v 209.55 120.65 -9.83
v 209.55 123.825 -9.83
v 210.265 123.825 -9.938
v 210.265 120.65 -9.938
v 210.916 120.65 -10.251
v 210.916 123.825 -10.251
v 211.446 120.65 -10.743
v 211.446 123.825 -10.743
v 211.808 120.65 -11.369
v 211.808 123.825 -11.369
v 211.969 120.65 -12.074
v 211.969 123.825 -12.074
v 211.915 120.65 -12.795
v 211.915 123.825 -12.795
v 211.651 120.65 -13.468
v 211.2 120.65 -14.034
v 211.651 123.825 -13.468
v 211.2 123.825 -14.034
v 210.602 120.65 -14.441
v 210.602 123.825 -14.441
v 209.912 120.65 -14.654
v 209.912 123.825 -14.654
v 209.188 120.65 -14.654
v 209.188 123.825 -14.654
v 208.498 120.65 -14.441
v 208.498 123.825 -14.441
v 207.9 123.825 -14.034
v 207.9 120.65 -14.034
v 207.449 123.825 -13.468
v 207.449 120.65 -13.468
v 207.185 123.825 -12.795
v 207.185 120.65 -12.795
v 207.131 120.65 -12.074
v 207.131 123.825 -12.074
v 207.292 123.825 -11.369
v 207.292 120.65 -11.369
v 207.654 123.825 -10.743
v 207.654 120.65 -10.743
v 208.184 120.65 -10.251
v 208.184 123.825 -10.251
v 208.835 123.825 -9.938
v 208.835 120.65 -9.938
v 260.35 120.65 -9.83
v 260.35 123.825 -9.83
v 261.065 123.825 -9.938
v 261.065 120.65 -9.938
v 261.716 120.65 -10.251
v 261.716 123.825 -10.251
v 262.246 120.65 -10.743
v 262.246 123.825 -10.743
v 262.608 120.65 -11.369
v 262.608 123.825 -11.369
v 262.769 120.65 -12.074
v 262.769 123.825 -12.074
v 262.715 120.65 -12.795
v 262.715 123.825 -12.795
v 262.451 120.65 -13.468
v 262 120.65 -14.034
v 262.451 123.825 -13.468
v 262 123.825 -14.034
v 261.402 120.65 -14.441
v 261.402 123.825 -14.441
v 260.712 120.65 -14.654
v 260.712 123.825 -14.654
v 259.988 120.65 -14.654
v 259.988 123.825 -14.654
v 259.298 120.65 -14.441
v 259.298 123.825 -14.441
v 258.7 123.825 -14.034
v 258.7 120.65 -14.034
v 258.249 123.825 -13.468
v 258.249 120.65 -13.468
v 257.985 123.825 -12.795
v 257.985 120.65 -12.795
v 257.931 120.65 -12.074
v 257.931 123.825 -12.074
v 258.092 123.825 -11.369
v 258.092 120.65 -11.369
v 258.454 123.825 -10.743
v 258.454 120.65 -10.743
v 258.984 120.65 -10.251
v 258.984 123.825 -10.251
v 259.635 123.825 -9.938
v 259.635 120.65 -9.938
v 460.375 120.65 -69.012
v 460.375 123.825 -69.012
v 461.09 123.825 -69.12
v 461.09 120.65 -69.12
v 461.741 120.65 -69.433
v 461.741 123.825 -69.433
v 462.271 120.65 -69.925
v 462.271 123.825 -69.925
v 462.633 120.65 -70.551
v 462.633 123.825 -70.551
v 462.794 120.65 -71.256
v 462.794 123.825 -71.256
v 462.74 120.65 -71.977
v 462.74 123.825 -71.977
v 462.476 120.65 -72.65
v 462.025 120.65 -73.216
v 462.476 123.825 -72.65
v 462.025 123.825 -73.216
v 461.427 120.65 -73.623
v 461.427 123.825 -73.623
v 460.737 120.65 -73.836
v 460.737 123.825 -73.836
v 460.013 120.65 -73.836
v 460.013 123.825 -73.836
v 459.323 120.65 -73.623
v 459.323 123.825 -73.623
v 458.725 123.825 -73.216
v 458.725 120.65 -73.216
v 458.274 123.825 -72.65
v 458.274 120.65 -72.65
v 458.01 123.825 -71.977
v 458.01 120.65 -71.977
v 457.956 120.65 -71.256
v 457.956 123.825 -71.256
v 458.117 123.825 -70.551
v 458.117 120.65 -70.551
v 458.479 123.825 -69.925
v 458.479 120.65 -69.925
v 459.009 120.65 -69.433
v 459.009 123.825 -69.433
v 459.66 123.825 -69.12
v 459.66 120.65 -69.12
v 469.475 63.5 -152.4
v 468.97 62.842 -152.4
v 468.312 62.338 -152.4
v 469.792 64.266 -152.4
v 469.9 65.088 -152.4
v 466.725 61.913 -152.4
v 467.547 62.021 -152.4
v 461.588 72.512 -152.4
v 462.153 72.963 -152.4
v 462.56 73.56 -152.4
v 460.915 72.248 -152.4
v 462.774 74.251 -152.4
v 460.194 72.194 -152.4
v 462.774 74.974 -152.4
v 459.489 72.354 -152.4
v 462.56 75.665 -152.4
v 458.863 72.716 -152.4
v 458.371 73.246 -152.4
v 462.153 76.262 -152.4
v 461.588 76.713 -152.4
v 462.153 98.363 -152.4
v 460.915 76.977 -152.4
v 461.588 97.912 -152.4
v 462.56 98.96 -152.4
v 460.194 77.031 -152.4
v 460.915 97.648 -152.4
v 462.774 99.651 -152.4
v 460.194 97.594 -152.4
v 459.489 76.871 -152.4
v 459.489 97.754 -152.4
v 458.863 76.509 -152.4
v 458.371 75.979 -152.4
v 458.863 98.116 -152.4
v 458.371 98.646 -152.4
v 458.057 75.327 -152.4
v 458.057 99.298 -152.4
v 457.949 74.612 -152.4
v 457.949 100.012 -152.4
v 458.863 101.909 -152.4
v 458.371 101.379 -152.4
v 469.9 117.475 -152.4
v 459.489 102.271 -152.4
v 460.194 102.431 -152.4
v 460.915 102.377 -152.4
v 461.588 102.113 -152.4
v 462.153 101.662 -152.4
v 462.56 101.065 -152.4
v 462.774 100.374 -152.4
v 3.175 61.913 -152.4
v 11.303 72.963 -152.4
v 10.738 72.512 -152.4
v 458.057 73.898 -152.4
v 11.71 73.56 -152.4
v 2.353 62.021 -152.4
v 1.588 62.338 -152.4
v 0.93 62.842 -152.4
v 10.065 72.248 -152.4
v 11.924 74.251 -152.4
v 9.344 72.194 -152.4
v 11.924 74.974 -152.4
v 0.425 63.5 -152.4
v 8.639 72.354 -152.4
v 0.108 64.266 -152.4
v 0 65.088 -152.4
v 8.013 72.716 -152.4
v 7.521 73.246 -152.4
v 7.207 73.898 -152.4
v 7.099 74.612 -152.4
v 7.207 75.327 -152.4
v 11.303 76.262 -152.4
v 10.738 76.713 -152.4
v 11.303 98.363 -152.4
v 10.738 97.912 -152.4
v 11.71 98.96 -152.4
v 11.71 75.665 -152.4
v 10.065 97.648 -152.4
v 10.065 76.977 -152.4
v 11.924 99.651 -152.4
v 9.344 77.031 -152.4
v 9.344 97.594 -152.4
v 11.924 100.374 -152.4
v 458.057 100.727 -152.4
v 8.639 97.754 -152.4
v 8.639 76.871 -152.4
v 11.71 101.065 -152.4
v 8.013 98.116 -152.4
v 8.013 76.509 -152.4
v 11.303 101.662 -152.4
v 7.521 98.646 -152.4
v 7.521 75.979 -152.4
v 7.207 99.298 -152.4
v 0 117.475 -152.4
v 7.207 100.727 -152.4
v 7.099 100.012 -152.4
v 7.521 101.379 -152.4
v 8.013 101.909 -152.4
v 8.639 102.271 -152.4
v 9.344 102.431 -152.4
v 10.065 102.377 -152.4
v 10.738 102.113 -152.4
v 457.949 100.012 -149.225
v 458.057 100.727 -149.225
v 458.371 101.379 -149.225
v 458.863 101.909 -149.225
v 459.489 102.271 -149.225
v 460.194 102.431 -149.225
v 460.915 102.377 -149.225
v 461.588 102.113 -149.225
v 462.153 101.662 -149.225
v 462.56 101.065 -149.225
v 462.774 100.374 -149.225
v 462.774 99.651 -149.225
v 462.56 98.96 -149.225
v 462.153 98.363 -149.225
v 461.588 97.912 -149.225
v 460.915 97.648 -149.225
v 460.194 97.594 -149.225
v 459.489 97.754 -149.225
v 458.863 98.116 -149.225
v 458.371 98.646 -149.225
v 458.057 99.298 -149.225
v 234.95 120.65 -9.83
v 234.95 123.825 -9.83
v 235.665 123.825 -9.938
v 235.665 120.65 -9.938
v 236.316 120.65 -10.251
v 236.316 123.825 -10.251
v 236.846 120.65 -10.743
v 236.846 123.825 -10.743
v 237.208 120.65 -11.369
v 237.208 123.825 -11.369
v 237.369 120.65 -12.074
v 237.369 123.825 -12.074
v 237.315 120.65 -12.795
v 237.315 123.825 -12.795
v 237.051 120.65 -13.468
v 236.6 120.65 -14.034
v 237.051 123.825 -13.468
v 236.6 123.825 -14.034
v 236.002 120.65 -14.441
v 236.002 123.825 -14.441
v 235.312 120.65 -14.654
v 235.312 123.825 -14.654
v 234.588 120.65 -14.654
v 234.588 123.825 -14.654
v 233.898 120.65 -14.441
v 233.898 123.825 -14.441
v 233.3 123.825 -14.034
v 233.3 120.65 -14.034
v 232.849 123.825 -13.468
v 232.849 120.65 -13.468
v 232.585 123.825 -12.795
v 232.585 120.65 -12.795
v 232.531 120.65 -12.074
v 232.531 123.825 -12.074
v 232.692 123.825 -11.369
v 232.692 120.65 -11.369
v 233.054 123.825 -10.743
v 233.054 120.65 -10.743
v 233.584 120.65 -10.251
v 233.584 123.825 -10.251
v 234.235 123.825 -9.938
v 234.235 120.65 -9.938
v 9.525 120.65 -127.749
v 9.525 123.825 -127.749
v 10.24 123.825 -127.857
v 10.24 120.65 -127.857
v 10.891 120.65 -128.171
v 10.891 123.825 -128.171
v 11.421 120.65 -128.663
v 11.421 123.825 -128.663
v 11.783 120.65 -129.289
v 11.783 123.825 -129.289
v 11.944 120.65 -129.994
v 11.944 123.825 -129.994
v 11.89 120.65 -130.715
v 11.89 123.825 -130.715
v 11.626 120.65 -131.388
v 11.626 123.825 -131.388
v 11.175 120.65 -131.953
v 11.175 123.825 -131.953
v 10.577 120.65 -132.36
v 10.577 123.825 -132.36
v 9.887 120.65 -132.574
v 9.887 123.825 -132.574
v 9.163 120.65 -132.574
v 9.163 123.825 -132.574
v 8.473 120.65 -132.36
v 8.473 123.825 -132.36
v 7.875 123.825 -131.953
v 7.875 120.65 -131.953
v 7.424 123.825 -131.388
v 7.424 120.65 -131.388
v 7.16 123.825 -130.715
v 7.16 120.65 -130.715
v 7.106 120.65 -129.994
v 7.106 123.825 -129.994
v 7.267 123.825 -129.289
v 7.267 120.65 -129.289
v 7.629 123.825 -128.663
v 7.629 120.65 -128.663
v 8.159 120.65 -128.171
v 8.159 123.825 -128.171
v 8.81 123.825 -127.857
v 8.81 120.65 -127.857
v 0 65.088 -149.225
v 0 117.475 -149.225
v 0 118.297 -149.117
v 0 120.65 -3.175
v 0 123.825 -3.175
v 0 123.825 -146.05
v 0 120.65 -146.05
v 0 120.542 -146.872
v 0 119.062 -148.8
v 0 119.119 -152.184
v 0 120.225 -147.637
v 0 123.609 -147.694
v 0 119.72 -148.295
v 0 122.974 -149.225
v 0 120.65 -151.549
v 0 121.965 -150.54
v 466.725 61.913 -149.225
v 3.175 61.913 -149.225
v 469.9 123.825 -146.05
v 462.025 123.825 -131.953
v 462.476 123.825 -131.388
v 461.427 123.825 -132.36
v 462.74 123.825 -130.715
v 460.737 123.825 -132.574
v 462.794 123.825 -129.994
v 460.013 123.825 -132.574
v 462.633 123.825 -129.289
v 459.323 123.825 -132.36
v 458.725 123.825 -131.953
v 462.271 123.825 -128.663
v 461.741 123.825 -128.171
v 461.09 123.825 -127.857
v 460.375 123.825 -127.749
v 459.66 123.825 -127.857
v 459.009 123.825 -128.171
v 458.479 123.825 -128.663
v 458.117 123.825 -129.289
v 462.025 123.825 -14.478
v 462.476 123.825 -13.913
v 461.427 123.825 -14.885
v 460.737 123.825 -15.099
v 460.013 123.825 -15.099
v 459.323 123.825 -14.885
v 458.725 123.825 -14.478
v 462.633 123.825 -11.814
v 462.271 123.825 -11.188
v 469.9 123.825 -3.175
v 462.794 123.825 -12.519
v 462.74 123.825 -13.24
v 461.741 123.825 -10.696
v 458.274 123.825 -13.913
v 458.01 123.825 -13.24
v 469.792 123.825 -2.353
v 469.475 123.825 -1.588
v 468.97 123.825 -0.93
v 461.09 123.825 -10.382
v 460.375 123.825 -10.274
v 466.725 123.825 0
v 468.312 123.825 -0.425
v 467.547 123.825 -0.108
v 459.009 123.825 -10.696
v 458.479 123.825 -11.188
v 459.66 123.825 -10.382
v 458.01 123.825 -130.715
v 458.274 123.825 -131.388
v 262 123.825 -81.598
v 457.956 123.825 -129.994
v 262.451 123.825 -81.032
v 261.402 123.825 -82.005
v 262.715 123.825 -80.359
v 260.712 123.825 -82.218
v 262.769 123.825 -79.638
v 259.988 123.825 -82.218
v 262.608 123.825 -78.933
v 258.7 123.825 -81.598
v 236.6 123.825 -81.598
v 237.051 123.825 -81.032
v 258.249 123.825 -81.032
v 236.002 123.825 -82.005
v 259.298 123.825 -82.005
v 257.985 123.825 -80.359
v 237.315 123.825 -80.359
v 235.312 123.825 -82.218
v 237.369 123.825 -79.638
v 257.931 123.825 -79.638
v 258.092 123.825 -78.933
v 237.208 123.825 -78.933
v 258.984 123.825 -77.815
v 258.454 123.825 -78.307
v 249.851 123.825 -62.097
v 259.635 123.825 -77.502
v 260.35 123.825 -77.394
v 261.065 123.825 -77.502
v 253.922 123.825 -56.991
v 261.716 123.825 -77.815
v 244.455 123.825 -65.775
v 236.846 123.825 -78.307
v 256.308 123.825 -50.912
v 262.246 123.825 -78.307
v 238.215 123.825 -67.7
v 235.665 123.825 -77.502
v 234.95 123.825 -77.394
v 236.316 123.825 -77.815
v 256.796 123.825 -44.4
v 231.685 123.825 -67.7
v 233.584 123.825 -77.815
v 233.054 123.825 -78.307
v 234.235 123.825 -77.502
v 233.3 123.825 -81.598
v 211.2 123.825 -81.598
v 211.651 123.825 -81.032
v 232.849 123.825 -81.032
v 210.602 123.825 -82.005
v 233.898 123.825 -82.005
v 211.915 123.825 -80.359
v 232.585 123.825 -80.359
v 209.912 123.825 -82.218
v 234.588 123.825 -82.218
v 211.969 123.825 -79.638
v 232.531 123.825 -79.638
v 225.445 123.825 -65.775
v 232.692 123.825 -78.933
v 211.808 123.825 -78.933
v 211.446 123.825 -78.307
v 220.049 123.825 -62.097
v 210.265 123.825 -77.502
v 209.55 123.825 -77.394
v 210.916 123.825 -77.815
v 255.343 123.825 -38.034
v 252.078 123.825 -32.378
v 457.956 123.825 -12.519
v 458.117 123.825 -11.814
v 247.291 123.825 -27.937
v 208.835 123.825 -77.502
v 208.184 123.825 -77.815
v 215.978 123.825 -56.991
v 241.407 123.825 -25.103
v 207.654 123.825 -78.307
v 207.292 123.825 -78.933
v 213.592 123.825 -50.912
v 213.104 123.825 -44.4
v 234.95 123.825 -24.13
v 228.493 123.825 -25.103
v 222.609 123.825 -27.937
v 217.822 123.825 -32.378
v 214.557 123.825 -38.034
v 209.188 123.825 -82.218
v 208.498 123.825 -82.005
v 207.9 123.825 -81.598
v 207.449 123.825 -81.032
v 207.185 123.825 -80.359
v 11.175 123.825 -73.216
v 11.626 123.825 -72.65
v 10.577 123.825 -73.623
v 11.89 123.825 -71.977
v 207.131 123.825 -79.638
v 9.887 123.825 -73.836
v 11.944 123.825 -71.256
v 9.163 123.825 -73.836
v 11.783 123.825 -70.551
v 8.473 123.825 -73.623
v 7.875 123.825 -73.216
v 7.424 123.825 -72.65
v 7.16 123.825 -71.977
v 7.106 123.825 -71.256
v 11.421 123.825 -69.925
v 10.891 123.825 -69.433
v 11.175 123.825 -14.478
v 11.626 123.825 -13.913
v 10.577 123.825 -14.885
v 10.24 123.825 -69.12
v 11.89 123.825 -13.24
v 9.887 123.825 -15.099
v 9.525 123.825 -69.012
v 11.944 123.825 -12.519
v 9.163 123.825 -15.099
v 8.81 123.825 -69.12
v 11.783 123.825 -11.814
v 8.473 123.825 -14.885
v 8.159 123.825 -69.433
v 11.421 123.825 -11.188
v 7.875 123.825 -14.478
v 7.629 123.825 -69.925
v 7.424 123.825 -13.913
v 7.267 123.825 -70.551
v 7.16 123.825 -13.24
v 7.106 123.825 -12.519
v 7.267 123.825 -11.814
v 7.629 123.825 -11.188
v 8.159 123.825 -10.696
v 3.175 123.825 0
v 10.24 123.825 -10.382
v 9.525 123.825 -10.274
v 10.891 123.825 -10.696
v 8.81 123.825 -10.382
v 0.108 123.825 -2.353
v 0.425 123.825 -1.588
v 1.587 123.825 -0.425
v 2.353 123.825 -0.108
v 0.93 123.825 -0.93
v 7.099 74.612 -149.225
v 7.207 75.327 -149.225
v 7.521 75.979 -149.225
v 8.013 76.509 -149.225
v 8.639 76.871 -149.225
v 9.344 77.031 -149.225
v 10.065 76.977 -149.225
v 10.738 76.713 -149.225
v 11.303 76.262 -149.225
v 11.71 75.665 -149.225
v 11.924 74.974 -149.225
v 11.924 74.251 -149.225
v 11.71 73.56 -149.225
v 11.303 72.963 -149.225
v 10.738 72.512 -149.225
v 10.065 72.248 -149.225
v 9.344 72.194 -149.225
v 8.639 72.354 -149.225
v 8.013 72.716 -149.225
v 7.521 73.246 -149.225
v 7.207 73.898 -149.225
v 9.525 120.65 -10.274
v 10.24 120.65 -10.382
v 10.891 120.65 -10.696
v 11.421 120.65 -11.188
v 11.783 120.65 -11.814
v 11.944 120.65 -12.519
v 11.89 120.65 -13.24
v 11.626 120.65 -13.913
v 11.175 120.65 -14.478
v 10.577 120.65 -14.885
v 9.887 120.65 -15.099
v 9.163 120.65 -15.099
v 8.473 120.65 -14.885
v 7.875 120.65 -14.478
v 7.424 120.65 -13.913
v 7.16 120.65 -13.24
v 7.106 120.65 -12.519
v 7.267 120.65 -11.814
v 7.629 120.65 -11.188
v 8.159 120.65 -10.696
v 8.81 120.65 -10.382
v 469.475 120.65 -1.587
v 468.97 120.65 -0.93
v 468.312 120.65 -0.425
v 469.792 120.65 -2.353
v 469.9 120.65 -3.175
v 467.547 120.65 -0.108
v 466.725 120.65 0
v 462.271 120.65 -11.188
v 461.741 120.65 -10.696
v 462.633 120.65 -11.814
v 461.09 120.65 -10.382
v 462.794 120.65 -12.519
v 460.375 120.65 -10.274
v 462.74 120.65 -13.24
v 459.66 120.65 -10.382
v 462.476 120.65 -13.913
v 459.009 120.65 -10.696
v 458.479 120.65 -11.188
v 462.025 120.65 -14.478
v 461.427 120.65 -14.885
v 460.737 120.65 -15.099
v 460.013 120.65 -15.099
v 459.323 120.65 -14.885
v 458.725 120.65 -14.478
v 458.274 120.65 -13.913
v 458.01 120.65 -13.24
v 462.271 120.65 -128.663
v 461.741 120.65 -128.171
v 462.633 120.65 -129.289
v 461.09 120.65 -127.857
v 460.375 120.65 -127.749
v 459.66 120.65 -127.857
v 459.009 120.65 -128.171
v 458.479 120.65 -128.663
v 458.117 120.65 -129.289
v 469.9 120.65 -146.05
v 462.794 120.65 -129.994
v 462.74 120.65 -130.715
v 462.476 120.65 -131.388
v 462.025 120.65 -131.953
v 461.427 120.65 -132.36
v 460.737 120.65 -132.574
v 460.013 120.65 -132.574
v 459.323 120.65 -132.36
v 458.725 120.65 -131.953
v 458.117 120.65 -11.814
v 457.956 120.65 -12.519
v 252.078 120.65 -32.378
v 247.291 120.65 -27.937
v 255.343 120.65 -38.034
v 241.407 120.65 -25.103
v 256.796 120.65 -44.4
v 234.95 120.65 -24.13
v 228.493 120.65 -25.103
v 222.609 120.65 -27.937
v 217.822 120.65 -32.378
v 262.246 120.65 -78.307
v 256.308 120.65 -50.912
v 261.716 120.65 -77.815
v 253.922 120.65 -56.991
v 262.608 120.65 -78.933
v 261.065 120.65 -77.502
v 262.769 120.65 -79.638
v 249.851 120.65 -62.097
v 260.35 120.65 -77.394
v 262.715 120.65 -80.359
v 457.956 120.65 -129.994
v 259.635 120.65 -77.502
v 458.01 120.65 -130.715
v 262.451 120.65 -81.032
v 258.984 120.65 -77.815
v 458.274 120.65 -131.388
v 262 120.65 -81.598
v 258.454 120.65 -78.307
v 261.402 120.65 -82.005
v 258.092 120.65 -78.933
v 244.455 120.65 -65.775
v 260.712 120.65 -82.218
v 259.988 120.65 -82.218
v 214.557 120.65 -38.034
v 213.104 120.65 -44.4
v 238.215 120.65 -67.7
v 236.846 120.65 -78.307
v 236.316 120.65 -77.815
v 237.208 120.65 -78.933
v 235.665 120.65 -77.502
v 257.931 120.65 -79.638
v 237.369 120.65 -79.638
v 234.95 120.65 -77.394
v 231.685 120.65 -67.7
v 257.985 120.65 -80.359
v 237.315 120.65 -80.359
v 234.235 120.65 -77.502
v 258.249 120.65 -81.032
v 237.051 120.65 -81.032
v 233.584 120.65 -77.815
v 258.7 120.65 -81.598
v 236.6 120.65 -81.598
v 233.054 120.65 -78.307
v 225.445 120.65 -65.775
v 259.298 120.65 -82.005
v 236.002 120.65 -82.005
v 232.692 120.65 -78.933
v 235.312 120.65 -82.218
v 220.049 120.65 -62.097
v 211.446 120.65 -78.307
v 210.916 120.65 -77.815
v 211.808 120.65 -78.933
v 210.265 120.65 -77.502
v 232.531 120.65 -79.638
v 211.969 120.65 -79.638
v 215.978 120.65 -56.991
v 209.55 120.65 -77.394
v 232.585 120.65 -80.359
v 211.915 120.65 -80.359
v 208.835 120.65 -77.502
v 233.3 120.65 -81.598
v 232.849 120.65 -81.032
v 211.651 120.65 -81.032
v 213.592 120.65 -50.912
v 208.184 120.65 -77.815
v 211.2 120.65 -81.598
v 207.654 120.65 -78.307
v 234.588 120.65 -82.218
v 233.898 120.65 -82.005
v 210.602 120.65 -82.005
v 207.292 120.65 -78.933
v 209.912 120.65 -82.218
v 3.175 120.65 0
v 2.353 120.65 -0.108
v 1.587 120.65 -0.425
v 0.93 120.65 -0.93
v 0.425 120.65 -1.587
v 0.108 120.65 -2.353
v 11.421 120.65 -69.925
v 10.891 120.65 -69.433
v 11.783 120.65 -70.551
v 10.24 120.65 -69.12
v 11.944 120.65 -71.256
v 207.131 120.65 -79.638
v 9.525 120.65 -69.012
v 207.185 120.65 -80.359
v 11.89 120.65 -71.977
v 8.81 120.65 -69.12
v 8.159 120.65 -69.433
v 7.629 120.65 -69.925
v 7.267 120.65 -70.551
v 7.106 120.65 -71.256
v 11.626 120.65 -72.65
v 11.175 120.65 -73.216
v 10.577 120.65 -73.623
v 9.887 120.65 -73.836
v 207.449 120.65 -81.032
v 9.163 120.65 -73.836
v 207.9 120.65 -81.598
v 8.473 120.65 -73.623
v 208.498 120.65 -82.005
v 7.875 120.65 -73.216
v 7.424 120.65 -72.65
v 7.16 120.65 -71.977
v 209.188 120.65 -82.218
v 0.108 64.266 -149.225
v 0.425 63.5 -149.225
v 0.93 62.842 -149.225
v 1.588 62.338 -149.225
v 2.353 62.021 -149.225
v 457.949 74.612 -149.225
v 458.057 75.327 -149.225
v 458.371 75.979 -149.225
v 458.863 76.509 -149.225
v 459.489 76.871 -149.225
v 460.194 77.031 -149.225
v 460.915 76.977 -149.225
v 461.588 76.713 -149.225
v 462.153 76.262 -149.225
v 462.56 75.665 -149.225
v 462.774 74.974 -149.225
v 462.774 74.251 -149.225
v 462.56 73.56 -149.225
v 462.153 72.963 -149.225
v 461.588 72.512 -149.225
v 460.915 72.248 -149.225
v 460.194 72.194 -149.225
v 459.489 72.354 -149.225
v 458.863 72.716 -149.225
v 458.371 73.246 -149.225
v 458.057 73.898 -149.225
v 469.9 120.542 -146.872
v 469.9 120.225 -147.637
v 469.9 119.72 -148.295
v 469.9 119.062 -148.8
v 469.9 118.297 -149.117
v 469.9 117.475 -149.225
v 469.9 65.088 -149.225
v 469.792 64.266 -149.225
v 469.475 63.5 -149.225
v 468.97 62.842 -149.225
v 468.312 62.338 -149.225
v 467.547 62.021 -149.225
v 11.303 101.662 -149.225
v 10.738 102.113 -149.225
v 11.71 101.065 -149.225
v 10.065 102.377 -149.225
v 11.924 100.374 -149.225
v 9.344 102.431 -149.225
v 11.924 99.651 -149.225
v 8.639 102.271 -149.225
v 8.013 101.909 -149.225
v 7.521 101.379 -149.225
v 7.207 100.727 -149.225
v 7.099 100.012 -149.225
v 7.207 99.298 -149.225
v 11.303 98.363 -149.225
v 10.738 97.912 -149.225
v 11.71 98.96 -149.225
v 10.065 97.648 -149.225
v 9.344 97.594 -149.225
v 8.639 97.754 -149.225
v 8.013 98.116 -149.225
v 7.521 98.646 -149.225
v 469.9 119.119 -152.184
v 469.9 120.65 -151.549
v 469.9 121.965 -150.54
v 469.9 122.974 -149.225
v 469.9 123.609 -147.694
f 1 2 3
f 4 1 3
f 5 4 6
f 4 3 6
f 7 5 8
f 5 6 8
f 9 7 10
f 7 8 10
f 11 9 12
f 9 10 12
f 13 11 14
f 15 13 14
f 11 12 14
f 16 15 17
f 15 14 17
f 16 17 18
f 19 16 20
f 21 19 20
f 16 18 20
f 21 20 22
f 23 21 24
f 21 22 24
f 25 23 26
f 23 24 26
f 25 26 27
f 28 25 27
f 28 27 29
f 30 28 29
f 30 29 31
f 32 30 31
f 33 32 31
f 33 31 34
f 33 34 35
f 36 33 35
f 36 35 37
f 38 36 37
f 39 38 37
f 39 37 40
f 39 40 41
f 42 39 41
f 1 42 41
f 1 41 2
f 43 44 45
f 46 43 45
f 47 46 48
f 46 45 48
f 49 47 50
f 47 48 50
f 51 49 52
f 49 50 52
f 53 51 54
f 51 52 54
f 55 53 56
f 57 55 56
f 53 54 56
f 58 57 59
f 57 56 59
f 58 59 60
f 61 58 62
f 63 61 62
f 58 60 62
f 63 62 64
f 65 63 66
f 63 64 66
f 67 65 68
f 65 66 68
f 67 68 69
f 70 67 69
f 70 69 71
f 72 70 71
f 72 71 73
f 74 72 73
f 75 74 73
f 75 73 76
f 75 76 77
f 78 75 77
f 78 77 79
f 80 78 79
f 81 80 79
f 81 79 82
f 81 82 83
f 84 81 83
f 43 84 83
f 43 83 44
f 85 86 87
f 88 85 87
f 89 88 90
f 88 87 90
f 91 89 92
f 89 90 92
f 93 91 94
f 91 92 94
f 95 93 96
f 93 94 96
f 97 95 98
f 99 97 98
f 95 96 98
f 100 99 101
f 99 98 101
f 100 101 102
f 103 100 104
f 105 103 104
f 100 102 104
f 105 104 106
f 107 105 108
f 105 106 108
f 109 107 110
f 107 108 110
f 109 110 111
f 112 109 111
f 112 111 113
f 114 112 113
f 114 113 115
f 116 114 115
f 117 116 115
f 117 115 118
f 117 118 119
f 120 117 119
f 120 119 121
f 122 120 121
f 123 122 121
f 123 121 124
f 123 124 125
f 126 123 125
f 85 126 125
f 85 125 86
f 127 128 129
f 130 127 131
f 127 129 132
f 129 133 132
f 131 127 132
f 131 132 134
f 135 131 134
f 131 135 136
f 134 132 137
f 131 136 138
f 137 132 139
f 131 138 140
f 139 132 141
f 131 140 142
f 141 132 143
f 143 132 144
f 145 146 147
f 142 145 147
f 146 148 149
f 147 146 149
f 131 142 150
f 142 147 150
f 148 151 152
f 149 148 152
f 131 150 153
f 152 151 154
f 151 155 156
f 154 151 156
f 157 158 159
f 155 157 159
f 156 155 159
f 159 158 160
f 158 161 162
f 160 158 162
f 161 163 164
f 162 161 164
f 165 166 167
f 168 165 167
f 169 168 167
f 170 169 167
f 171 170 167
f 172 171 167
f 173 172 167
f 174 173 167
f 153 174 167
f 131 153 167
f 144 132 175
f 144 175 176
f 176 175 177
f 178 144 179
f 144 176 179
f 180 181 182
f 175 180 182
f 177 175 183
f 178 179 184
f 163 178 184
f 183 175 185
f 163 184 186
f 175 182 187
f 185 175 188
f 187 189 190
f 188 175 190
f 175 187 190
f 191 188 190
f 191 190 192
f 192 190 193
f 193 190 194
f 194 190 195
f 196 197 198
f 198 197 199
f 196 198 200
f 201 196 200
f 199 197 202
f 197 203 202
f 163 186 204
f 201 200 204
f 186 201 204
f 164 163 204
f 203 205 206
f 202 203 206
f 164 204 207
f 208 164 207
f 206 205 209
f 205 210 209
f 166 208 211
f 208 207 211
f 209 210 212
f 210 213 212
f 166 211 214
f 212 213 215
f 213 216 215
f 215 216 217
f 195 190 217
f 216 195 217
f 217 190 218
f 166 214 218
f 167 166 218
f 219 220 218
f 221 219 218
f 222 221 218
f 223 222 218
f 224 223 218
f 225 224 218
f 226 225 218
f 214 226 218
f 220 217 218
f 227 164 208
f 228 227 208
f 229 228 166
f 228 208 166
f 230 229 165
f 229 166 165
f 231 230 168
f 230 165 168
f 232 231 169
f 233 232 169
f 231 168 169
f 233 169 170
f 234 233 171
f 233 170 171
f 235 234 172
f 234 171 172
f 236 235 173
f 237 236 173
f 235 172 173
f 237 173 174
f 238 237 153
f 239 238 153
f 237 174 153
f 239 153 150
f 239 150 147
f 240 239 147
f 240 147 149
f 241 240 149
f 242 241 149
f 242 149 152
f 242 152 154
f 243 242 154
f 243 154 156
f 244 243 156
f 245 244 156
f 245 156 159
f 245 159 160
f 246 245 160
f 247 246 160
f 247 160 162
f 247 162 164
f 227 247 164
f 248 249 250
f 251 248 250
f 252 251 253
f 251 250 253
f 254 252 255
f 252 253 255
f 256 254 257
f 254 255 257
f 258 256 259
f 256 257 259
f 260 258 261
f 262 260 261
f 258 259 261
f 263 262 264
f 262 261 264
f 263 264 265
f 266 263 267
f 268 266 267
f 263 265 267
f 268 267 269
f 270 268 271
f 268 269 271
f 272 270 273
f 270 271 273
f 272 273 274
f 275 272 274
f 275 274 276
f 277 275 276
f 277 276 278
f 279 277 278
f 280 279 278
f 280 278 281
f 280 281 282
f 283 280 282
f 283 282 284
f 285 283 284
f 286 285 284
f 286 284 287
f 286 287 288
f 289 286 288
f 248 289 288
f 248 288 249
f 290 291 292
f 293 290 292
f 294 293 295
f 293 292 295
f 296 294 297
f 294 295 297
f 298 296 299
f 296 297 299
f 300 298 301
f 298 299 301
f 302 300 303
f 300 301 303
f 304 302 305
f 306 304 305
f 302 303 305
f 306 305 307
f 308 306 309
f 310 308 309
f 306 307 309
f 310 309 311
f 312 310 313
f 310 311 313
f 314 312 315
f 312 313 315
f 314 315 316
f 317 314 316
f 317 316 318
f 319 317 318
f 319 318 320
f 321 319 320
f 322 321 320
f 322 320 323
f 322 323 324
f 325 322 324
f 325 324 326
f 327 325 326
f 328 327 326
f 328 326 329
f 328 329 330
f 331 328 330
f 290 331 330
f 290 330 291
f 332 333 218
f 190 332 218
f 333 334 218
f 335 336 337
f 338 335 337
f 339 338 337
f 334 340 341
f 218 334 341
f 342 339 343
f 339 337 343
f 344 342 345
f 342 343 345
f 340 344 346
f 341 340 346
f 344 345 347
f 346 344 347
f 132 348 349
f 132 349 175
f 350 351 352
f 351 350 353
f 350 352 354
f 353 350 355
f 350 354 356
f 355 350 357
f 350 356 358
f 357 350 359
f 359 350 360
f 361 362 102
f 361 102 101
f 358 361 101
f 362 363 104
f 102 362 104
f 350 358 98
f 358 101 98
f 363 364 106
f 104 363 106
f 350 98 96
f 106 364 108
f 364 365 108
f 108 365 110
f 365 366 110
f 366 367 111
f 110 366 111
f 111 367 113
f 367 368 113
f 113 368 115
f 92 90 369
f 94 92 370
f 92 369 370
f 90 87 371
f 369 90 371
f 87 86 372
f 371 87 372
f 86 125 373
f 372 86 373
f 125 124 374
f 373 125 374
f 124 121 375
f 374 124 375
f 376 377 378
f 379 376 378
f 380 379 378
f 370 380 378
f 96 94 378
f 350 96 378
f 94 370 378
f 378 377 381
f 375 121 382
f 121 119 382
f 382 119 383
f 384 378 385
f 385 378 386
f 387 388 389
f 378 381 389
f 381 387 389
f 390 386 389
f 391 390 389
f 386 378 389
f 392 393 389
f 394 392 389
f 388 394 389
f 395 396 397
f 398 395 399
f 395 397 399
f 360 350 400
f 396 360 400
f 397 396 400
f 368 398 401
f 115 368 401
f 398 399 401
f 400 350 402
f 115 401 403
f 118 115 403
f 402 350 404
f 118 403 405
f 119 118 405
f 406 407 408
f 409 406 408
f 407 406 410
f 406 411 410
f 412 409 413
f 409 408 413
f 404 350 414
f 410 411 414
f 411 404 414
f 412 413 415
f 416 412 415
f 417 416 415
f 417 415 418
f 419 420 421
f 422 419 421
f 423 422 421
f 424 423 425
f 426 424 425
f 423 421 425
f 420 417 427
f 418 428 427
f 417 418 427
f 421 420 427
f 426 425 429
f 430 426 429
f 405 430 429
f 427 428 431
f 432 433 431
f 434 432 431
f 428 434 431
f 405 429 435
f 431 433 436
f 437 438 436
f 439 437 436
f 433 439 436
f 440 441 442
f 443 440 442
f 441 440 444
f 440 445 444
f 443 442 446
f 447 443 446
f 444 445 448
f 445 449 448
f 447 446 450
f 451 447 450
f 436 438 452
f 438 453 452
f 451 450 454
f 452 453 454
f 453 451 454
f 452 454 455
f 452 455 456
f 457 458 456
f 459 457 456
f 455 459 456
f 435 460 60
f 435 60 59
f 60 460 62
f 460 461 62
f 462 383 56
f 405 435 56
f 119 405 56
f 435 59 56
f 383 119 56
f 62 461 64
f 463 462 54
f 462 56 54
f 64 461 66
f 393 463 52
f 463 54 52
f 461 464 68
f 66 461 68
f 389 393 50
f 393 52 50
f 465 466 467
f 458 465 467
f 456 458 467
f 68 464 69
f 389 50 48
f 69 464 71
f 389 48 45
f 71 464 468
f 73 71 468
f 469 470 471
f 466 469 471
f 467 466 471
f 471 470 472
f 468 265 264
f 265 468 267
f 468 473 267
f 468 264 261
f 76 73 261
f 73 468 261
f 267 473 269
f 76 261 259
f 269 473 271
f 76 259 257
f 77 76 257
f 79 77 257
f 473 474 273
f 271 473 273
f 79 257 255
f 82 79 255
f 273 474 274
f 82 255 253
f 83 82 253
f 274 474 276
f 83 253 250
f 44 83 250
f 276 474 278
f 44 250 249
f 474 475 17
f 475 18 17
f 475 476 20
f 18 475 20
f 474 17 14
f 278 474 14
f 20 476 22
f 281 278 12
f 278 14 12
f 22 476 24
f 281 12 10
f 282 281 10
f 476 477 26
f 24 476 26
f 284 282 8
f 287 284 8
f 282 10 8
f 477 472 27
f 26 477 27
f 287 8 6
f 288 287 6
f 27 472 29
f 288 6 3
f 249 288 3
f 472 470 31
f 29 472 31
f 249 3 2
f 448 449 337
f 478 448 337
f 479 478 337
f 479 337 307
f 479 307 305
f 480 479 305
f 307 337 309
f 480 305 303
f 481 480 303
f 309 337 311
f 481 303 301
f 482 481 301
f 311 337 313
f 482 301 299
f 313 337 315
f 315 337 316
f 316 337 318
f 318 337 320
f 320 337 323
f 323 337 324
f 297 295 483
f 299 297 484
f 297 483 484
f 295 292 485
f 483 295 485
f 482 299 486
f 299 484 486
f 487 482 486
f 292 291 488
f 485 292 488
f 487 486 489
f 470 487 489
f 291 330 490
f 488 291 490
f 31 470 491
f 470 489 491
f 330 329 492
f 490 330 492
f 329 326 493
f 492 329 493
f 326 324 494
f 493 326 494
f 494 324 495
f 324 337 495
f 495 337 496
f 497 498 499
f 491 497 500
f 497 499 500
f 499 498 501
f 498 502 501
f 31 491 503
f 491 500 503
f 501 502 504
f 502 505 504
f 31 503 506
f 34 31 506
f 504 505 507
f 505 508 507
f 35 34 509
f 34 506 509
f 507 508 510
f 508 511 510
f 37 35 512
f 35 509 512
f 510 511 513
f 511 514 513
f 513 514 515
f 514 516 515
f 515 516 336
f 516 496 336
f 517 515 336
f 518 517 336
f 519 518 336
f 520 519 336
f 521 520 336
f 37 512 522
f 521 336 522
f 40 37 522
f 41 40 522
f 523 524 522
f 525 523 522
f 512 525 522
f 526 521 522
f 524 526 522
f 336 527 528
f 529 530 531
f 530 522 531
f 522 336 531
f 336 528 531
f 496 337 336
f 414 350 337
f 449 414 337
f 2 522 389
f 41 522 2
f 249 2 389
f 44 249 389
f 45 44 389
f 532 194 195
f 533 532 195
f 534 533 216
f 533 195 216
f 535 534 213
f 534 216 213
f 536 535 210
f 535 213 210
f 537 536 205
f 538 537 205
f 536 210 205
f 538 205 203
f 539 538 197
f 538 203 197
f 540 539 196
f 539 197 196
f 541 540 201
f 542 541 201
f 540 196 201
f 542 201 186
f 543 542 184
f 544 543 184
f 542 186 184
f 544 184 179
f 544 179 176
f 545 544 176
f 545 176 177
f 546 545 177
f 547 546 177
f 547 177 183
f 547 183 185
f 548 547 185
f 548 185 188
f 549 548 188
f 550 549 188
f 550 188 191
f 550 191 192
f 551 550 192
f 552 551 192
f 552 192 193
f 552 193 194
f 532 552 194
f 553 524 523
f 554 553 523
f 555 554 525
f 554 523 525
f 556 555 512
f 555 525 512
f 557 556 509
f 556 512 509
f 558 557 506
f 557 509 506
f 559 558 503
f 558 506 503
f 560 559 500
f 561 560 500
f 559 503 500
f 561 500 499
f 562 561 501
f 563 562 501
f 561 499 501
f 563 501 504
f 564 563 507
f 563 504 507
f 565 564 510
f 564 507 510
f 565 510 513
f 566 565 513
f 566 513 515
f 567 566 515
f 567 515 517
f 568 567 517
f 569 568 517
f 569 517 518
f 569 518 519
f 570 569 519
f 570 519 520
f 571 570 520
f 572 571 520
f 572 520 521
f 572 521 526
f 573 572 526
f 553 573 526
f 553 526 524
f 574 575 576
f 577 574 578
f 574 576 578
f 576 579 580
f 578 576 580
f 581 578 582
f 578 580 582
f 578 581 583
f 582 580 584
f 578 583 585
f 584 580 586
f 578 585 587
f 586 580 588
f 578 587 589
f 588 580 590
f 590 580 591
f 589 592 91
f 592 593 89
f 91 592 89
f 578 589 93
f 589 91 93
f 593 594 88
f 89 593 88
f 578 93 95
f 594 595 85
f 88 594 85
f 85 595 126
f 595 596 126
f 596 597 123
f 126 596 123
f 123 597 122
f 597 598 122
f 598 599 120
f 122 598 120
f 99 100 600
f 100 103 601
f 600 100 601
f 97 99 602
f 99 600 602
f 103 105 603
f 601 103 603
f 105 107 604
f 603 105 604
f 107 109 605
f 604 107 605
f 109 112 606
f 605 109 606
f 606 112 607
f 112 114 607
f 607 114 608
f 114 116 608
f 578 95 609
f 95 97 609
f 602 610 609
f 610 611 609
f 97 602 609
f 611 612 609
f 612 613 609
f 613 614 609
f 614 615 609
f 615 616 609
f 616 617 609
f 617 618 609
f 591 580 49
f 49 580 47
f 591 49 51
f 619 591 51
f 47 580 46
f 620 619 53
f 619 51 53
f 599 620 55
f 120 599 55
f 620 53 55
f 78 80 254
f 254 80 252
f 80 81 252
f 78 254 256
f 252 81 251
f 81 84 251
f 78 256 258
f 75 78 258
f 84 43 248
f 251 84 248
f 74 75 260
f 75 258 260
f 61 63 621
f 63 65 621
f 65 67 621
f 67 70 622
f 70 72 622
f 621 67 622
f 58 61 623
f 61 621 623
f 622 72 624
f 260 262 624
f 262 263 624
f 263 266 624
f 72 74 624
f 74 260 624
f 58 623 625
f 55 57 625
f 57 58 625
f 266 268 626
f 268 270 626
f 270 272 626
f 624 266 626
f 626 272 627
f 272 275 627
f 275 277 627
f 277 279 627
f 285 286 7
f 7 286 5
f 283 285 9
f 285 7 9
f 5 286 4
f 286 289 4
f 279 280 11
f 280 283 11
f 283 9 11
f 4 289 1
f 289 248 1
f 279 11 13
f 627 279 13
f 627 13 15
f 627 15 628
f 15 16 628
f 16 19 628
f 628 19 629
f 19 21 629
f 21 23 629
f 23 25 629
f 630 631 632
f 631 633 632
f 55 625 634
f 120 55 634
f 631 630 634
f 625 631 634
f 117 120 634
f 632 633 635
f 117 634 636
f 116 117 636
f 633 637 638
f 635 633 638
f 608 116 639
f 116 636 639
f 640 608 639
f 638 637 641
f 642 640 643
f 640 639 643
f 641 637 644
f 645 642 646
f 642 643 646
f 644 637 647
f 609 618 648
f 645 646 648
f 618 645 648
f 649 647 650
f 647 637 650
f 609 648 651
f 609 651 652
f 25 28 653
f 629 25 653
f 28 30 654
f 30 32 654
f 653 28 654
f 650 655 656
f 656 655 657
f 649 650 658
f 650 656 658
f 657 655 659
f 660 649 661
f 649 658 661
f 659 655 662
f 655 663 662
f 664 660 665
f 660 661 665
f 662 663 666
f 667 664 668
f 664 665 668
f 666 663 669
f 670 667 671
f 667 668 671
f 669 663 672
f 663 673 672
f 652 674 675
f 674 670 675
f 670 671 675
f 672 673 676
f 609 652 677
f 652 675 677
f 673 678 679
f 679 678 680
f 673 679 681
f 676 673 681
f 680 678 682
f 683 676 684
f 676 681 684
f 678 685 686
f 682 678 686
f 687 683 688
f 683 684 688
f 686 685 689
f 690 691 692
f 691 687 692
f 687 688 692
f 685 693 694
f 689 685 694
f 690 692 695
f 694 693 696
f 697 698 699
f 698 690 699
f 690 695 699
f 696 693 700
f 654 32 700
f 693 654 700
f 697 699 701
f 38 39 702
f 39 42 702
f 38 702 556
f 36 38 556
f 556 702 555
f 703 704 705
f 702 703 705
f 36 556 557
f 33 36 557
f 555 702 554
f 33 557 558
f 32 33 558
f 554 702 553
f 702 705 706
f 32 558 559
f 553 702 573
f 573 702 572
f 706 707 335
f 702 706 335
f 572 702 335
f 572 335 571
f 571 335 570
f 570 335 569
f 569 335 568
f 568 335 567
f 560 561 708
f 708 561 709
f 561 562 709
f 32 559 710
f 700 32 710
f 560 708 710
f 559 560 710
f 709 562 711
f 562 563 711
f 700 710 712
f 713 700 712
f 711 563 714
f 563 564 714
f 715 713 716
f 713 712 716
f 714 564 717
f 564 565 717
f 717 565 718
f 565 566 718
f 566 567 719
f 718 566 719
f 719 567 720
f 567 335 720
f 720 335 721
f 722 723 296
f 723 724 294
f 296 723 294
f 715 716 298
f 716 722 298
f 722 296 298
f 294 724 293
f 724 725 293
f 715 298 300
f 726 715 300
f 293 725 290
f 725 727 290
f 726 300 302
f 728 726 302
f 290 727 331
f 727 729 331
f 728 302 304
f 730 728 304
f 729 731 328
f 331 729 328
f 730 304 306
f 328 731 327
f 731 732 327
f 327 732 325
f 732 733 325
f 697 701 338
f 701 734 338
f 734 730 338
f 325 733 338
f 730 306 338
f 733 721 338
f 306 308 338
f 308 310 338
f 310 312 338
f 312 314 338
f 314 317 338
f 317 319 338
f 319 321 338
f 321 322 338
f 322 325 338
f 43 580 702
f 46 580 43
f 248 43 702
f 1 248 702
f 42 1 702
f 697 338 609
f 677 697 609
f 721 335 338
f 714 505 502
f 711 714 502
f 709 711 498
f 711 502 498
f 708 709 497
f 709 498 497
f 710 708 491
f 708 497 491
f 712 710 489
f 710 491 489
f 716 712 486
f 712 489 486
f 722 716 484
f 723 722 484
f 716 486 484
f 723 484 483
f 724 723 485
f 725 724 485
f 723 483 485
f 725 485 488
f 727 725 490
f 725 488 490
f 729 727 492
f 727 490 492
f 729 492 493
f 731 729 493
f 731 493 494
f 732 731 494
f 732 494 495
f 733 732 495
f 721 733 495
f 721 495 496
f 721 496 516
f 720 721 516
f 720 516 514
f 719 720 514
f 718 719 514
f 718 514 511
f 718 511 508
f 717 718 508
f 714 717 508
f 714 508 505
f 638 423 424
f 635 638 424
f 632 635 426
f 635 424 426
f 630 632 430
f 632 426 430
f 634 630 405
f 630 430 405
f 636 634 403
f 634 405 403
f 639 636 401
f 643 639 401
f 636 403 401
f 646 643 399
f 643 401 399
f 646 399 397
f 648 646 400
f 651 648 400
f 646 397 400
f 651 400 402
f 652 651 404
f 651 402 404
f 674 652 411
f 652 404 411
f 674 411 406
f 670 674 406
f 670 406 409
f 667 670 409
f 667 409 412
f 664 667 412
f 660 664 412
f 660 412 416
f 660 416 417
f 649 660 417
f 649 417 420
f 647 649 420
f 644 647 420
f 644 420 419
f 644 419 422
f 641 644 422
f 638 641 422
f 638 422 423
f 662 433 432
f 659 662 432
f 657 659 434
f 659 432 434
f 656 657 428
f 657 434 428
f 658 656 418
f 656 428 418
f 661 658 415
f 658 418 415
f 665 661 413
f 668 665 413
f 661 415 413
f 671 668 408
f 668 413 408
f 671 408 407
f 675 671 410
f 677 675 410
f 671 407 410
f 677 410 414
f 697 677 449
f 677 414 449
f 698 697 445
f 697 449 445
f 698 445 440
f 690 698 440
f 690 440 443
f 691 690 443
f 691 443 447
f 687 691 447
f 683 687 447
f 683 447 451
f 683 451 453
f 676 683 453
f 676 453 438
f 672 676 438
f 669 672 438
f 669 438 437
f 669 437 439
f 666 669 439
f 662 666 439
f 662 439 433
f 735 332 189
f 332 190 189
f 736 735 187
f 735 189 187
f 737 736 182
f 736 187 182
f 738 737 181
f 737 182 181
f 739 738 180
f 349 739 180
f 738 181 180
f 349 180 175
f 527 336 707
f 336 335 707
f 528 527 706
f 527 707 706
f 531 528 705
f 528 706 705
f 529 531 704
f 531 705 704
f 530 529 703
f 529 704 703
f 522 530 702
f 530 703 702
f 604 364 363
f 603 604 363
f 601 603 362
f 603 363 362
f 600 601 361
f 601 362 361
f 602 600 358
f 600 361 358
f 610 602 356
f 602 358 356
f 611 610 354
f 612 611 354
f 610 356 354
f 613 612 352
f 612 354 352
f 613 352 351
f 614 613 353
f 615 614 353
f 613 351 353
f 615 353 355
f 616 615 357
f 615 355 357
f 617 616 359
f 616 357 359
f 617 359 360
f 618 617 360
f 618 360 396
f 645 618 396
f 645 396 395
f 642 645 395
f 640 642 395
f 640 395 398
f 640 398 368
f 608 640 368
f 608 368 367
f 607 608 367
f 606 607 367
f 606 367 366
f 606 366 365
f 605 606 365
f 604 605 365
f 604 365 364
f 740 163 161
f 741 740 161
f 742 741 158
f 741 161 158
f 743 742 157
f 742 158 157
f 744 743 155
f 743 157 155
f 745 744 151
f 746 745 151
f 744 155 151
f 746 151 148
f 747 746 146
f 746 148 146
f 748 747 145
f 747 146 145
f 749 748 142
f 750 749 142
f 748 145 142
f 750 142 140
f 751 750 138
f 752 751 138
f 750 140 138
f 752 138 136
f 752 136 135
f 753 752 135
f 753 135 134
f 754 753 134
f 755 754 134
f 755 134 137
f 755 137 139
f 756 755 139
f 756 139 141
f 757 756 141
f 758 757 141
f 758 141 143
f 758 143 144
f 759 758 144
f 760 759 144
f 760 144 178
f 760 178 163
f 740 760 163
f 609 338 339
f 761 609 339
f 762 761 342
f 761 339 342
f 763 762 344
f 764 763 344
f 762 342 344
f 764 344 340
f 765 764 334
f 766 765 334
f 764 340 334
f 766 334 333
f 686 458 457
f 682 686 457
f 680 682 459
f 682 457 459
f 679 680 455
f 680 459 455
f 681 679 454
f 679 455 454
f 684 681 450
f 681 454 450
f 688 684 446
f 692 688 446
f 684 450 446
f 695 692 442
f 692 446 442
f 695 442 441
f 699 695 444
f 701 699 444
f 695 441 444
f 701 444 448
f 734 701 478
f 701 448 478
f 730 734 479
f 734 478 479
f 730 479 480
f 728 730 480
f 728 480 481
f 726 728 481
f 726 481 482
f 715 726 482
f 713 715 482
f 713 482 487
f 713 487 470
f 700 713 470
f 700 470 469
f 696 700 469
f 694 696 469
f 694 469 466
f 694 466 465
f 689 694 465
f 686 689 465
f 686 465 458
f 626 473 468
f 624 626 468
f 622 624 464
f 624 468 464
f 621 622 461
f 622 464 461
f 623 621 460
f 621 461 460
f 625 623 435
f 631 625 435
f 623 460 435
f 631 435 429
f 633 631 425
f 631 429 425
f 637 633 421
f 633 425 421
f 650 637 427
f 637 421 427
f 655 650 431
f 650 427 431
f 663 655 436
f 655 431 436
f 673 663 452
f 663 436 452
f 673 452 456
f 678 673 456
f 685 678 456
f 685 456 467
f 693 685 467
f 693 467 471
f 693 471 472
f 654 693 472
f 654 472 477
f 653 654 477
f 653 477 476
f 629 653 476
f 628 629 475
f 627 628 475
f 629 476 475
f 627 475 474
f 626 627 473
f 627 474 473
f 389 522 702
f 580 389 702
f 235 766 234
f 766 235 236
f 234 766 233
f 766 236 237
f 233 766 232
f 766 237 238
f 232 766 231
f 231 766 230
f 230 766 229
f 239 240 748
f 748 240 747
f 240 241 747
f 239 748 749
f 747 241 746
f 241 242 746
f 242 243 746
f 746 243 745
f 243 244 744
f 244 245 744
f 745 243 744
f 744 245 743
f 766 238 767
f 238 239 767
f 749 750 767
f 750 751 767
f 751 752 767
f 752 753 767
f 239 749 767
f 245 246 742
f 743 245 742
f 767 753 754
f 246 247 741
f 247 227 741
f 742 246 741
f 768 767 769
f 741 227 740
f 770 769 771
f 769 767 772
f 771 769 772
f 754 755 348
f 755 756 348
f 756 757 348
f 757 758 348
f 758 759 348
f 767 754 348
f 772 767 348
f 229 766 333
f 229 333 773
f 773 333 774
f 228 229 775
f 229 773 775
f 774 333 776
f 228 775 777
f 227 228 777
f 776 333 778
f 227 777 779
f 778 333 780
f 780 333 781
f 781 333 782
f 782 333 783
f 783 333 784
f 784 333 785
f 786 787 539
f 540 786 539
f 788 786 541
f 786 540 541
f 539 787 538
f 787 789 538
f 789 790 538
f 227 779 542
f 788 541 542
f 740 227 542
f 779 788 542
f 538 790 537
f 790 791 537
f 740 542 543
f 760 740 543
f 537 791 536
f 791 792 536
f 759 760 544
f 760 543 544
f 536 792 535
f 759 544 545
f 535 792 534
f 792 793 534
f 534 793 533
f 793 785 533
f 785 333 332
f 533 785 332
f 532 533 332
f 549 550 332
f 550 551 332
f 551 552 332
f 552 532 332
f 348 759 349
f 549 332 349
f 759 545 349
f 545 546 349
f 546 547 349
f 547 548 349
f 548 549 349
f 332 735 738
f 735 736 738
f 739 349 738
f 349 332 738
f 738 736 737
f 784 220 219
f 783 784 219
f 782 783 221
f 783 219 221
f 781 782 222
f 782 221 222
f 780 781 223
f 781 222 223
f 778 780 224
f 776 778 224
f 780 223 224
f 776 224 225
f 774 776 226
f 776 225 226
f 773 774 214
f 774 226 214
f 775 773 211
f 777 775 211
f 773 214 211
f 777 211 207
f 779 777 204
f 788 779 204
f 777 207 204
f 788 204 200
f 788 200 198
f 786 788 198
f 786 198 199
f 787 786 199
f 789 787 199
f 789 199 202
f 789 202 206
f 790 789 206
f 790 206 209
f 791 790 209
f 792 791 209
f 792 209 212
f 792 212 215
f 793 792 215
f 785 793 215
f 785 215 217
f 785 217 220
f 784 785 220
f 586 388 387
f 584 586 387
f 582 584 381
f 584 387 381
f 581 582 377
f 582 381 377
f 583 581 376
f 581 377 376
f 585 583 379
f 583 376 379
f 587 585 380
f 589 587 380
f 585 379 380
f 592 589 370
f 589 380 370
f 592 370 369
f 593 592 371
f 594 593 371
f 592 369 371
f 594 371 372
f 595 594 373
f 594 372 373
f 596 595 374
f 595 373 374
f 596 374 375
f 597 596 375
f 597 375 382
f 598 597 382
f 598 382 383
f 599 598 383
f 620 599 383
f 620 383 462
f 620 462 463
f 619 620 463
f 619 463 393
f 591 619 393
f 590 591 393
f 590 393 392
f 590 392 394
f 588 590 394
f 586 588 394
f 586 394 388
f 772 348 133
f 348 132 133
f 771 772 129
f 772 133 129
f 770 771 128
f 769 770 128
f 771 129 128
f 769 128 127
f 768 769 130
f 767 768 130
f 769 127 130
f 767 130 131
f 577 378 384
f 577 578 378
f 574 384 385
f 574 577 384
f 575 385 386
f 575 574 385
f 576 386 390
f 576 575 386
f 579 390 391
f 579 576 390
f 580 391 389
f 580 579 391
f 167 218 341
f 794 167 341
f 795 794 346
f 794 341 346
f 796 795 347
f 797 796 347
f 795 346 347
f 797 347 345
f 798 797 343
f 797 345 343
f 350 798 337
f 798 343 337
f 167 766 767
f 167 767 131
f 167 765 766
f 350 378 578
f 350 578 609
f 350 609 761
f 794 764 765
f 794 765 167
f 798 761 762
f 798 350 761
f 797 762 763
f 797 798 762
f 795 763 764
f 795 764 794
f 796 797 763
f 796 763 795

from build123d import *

# Parameters (mm, degrees)
BASE_FLANGE1_DEPTH = 469.9
SKETCH6_R          = 21.9075
CUT_EXTRUDE1_DEPTH = 3.175
SKETCH7_R          = 2.4257
CUT_EXTRUDE2_DEPTH = 510.278313523
SKETCH8_R          = 2.4257
CUT_EXTRUDE3_DEPTH = 510.278313523
SKETCH9_R          = 2.4257
CUT_EXTRUDE4_DEPTH = 510.278313523
FILLET1_R          = 3.175
SKETCH10_W         = 152.4
SKETCH10_H         = 61.9125
CUT_EXTRUDE5_DEPTH = 510.278313523
FILLET2_R          = 3.175


# Sheet-metal steps are written as plain solids
with BuildPart() as part:
    # Sketch1 → Base-Flange1 (new body)
    with BuildSketch(Plane(origin=(0, 0, 0), x_dir=(0, 0, -1), z_dir=(1, 0, 0))):
        with BuildLine():
            Line((0, 0), (146.05, 0))
            ThreePointArc((146.05, 0), (150.540128061, 1.859871939), (152.4, 6.35))
            Line((152.4, 6.35), (152.4, 117.475))
            ThreePointArc((152.4, 117.475), (150.540128061, 121.965128061), (146.05, 123.825))
            Line((146.05, 123.825), (0, 123.825))
            Line((0, 123.825), (0, 120.65))
            Line((0, 120.65), (146.05, 120.65))
            ThreePointArc((146.05, 120.65), (148.29506403, 119.72006403), (149.225, 117.475))
            Line((149.225, 117.475), (149.225, 6.35))
            ThreePointArc((149.225, 6.35), (148.29506403, 4.10493597), (146.05, 3.175))
            Line((146.05, 3.175), (0, 3.175))
            Line((0, 3.175), (0, 0))
        make_face()
    extrude(amount=BASE_FLANGE1_DEPTH)

    # Sketch6 → Cut-Extrude1 (cut)
    with BuildSketch(Plane(origin=(0, 123.825, 0), x_dir=(1, 0, 0), z_dir=(0, 1, 0))):
        with Locations(Location((234.95, 46.0375, 0), (0, 0, 270))):
            Circle(SKETCH6_R)
    extrude(amount=-CUT_EXTRUDE1_DEPTH, mode=Mode.SUBTRACT)

    # Sketch7 → Cut-Extrude2 (cut, through all)
    with BuildSketch(Plane(origin=(0, 123.825, 0), x_dir=(1, 0, 0), z_dir=(0, 1, 0))):
        with Locations(Location((234.95, 12.2555, 0), (0, 0, 270))):
            Circle(SKETCH7_R)
        with Locations(Location((234.95, 79.8195, 0), (0, 0, 270))):
            Circle(SKETCH7_R)
        with Locations(Location((209.55, 12.2555, 0), (0, 0, 270))):
            Circle(SKETCH7_R)
        with Locations(Location((260.35, 12.2555, 0), (0, 0, 270))):
            Circle(SKETCH7_R)
        with Locations(Location((260.35, 79.8195, 0), (0, 0, 270))):
            Circle(SKETCH7_R)
        with Locations(Location((209.55, 79.8195, 0), (0, 0, 270))):
            Circle(SKETCH7_R)
    extrude(amount=-CUT_EXTRUDE2_DEPTH, mode=Mode.SUBTRACT)

    # Sketch8 → Cut-Extrude3 (cut, through all)
    with BuildSketch(Plane(origin=(0, 123.825, 0), x_dir=(1, 0, 0), z_dir=(0, 1, 0))):
        with Locations(Location((460.375, 12.7, 0), (0, 0, 270))):
            Circle(SKETCH8_R)
        with Locations(Location((460.375, 71.4375, 0), (0, 0, 270))):
            Circle(SKETCH8_R)
        with Locations(Location((460.375, 130.175, 0), (0, 0, 270))):
            Circle(SKETCH8_R)
        with Locations(Location((9.525, 130.175, 0), (0, 0, 270))):
            Circle(SKETCH8_R)
        with Locations(Location((9.525, 71.4375, 0), (0, 0, 270))):
            Circle(SKETCH8_R)
        with Locations(Location((9.525, 12.7, 0), (0, 0, 270))):
            Circle(SKETCH8_R)
    extrude(amount=-CUT_EXTRUDE3_DEPTH, mode=Mode.SUBTRACT)

    # Sketch9 → Cut-Extrude4 (cut, through all)
    with BuildSketch(Plane(origin=(0, 0, -152.4), x_dir=(-1, 0, 0), z_dir=(0, 0, -1))):
        with Locations((-460.375, 74.6125)):
            Circle(SKETCH9_R)
        with Locations((-460.375, 49.2125)):
            Circle(SKETCH9_R)
        with Locations((-9.525, 49.2125)):
            Circle(SKETCH9_R)
        with Locations((-9.525, 74.6125)):
            Circle(SKETCH9_R)
        with Locations((-460.375, 100.0125)):
            Circle(SKETCH9_R)
        with Locations((-460.375, 23.8125)):
            Circle(SKETCH9_R)
        with Locations((-9.525, 23.8125)):
            Circle(SKETCH9_R)
        with Locations((-9.525, 100.0125)):
            Circle(SKETCH9_R)
    extrude(amount=-CUT_EXTRUDE4_DEPTH, mode=Mode.SUBTRACT)

    # Fillet1
    fillet1_edges = [part.edges().sort_by_distance(p)[0] for p in [
        (0, 1.5875, 0),
        (0, 122.2375, 0),
        (469.9, 1.5875, 0),
        (469.9, 122.2375, 0),
    ]]
    fillet(fillet1_edges, radius=FILLET1_R)

    # Sketch10 → Cut-Extrude5 (cut, through all)
    with BuildSketch(Plane(origin=(469.9, 0, 0), x_dir=(0, 0, -1), z_dir=(1, 0, 0))):
        with Locations((76.2, 30.95625)):
            Rectangle(SKETCH10_W, SKETCH10_H)
    extrude(amount=-CUT_EXTRUDE5_DEPTH, mode=Mode.SUBTRACT)

    # Fillet2
    fillet2_edges = [part.edges().sort_by_distance(p)[0] for p in [
        (469.9, 61.9125, -150.8125),
        (0, 61.9125, -150.8125),
    ]]
    fillet(fillet2_edges, radius=FILLET2_R)


solid = part.part
